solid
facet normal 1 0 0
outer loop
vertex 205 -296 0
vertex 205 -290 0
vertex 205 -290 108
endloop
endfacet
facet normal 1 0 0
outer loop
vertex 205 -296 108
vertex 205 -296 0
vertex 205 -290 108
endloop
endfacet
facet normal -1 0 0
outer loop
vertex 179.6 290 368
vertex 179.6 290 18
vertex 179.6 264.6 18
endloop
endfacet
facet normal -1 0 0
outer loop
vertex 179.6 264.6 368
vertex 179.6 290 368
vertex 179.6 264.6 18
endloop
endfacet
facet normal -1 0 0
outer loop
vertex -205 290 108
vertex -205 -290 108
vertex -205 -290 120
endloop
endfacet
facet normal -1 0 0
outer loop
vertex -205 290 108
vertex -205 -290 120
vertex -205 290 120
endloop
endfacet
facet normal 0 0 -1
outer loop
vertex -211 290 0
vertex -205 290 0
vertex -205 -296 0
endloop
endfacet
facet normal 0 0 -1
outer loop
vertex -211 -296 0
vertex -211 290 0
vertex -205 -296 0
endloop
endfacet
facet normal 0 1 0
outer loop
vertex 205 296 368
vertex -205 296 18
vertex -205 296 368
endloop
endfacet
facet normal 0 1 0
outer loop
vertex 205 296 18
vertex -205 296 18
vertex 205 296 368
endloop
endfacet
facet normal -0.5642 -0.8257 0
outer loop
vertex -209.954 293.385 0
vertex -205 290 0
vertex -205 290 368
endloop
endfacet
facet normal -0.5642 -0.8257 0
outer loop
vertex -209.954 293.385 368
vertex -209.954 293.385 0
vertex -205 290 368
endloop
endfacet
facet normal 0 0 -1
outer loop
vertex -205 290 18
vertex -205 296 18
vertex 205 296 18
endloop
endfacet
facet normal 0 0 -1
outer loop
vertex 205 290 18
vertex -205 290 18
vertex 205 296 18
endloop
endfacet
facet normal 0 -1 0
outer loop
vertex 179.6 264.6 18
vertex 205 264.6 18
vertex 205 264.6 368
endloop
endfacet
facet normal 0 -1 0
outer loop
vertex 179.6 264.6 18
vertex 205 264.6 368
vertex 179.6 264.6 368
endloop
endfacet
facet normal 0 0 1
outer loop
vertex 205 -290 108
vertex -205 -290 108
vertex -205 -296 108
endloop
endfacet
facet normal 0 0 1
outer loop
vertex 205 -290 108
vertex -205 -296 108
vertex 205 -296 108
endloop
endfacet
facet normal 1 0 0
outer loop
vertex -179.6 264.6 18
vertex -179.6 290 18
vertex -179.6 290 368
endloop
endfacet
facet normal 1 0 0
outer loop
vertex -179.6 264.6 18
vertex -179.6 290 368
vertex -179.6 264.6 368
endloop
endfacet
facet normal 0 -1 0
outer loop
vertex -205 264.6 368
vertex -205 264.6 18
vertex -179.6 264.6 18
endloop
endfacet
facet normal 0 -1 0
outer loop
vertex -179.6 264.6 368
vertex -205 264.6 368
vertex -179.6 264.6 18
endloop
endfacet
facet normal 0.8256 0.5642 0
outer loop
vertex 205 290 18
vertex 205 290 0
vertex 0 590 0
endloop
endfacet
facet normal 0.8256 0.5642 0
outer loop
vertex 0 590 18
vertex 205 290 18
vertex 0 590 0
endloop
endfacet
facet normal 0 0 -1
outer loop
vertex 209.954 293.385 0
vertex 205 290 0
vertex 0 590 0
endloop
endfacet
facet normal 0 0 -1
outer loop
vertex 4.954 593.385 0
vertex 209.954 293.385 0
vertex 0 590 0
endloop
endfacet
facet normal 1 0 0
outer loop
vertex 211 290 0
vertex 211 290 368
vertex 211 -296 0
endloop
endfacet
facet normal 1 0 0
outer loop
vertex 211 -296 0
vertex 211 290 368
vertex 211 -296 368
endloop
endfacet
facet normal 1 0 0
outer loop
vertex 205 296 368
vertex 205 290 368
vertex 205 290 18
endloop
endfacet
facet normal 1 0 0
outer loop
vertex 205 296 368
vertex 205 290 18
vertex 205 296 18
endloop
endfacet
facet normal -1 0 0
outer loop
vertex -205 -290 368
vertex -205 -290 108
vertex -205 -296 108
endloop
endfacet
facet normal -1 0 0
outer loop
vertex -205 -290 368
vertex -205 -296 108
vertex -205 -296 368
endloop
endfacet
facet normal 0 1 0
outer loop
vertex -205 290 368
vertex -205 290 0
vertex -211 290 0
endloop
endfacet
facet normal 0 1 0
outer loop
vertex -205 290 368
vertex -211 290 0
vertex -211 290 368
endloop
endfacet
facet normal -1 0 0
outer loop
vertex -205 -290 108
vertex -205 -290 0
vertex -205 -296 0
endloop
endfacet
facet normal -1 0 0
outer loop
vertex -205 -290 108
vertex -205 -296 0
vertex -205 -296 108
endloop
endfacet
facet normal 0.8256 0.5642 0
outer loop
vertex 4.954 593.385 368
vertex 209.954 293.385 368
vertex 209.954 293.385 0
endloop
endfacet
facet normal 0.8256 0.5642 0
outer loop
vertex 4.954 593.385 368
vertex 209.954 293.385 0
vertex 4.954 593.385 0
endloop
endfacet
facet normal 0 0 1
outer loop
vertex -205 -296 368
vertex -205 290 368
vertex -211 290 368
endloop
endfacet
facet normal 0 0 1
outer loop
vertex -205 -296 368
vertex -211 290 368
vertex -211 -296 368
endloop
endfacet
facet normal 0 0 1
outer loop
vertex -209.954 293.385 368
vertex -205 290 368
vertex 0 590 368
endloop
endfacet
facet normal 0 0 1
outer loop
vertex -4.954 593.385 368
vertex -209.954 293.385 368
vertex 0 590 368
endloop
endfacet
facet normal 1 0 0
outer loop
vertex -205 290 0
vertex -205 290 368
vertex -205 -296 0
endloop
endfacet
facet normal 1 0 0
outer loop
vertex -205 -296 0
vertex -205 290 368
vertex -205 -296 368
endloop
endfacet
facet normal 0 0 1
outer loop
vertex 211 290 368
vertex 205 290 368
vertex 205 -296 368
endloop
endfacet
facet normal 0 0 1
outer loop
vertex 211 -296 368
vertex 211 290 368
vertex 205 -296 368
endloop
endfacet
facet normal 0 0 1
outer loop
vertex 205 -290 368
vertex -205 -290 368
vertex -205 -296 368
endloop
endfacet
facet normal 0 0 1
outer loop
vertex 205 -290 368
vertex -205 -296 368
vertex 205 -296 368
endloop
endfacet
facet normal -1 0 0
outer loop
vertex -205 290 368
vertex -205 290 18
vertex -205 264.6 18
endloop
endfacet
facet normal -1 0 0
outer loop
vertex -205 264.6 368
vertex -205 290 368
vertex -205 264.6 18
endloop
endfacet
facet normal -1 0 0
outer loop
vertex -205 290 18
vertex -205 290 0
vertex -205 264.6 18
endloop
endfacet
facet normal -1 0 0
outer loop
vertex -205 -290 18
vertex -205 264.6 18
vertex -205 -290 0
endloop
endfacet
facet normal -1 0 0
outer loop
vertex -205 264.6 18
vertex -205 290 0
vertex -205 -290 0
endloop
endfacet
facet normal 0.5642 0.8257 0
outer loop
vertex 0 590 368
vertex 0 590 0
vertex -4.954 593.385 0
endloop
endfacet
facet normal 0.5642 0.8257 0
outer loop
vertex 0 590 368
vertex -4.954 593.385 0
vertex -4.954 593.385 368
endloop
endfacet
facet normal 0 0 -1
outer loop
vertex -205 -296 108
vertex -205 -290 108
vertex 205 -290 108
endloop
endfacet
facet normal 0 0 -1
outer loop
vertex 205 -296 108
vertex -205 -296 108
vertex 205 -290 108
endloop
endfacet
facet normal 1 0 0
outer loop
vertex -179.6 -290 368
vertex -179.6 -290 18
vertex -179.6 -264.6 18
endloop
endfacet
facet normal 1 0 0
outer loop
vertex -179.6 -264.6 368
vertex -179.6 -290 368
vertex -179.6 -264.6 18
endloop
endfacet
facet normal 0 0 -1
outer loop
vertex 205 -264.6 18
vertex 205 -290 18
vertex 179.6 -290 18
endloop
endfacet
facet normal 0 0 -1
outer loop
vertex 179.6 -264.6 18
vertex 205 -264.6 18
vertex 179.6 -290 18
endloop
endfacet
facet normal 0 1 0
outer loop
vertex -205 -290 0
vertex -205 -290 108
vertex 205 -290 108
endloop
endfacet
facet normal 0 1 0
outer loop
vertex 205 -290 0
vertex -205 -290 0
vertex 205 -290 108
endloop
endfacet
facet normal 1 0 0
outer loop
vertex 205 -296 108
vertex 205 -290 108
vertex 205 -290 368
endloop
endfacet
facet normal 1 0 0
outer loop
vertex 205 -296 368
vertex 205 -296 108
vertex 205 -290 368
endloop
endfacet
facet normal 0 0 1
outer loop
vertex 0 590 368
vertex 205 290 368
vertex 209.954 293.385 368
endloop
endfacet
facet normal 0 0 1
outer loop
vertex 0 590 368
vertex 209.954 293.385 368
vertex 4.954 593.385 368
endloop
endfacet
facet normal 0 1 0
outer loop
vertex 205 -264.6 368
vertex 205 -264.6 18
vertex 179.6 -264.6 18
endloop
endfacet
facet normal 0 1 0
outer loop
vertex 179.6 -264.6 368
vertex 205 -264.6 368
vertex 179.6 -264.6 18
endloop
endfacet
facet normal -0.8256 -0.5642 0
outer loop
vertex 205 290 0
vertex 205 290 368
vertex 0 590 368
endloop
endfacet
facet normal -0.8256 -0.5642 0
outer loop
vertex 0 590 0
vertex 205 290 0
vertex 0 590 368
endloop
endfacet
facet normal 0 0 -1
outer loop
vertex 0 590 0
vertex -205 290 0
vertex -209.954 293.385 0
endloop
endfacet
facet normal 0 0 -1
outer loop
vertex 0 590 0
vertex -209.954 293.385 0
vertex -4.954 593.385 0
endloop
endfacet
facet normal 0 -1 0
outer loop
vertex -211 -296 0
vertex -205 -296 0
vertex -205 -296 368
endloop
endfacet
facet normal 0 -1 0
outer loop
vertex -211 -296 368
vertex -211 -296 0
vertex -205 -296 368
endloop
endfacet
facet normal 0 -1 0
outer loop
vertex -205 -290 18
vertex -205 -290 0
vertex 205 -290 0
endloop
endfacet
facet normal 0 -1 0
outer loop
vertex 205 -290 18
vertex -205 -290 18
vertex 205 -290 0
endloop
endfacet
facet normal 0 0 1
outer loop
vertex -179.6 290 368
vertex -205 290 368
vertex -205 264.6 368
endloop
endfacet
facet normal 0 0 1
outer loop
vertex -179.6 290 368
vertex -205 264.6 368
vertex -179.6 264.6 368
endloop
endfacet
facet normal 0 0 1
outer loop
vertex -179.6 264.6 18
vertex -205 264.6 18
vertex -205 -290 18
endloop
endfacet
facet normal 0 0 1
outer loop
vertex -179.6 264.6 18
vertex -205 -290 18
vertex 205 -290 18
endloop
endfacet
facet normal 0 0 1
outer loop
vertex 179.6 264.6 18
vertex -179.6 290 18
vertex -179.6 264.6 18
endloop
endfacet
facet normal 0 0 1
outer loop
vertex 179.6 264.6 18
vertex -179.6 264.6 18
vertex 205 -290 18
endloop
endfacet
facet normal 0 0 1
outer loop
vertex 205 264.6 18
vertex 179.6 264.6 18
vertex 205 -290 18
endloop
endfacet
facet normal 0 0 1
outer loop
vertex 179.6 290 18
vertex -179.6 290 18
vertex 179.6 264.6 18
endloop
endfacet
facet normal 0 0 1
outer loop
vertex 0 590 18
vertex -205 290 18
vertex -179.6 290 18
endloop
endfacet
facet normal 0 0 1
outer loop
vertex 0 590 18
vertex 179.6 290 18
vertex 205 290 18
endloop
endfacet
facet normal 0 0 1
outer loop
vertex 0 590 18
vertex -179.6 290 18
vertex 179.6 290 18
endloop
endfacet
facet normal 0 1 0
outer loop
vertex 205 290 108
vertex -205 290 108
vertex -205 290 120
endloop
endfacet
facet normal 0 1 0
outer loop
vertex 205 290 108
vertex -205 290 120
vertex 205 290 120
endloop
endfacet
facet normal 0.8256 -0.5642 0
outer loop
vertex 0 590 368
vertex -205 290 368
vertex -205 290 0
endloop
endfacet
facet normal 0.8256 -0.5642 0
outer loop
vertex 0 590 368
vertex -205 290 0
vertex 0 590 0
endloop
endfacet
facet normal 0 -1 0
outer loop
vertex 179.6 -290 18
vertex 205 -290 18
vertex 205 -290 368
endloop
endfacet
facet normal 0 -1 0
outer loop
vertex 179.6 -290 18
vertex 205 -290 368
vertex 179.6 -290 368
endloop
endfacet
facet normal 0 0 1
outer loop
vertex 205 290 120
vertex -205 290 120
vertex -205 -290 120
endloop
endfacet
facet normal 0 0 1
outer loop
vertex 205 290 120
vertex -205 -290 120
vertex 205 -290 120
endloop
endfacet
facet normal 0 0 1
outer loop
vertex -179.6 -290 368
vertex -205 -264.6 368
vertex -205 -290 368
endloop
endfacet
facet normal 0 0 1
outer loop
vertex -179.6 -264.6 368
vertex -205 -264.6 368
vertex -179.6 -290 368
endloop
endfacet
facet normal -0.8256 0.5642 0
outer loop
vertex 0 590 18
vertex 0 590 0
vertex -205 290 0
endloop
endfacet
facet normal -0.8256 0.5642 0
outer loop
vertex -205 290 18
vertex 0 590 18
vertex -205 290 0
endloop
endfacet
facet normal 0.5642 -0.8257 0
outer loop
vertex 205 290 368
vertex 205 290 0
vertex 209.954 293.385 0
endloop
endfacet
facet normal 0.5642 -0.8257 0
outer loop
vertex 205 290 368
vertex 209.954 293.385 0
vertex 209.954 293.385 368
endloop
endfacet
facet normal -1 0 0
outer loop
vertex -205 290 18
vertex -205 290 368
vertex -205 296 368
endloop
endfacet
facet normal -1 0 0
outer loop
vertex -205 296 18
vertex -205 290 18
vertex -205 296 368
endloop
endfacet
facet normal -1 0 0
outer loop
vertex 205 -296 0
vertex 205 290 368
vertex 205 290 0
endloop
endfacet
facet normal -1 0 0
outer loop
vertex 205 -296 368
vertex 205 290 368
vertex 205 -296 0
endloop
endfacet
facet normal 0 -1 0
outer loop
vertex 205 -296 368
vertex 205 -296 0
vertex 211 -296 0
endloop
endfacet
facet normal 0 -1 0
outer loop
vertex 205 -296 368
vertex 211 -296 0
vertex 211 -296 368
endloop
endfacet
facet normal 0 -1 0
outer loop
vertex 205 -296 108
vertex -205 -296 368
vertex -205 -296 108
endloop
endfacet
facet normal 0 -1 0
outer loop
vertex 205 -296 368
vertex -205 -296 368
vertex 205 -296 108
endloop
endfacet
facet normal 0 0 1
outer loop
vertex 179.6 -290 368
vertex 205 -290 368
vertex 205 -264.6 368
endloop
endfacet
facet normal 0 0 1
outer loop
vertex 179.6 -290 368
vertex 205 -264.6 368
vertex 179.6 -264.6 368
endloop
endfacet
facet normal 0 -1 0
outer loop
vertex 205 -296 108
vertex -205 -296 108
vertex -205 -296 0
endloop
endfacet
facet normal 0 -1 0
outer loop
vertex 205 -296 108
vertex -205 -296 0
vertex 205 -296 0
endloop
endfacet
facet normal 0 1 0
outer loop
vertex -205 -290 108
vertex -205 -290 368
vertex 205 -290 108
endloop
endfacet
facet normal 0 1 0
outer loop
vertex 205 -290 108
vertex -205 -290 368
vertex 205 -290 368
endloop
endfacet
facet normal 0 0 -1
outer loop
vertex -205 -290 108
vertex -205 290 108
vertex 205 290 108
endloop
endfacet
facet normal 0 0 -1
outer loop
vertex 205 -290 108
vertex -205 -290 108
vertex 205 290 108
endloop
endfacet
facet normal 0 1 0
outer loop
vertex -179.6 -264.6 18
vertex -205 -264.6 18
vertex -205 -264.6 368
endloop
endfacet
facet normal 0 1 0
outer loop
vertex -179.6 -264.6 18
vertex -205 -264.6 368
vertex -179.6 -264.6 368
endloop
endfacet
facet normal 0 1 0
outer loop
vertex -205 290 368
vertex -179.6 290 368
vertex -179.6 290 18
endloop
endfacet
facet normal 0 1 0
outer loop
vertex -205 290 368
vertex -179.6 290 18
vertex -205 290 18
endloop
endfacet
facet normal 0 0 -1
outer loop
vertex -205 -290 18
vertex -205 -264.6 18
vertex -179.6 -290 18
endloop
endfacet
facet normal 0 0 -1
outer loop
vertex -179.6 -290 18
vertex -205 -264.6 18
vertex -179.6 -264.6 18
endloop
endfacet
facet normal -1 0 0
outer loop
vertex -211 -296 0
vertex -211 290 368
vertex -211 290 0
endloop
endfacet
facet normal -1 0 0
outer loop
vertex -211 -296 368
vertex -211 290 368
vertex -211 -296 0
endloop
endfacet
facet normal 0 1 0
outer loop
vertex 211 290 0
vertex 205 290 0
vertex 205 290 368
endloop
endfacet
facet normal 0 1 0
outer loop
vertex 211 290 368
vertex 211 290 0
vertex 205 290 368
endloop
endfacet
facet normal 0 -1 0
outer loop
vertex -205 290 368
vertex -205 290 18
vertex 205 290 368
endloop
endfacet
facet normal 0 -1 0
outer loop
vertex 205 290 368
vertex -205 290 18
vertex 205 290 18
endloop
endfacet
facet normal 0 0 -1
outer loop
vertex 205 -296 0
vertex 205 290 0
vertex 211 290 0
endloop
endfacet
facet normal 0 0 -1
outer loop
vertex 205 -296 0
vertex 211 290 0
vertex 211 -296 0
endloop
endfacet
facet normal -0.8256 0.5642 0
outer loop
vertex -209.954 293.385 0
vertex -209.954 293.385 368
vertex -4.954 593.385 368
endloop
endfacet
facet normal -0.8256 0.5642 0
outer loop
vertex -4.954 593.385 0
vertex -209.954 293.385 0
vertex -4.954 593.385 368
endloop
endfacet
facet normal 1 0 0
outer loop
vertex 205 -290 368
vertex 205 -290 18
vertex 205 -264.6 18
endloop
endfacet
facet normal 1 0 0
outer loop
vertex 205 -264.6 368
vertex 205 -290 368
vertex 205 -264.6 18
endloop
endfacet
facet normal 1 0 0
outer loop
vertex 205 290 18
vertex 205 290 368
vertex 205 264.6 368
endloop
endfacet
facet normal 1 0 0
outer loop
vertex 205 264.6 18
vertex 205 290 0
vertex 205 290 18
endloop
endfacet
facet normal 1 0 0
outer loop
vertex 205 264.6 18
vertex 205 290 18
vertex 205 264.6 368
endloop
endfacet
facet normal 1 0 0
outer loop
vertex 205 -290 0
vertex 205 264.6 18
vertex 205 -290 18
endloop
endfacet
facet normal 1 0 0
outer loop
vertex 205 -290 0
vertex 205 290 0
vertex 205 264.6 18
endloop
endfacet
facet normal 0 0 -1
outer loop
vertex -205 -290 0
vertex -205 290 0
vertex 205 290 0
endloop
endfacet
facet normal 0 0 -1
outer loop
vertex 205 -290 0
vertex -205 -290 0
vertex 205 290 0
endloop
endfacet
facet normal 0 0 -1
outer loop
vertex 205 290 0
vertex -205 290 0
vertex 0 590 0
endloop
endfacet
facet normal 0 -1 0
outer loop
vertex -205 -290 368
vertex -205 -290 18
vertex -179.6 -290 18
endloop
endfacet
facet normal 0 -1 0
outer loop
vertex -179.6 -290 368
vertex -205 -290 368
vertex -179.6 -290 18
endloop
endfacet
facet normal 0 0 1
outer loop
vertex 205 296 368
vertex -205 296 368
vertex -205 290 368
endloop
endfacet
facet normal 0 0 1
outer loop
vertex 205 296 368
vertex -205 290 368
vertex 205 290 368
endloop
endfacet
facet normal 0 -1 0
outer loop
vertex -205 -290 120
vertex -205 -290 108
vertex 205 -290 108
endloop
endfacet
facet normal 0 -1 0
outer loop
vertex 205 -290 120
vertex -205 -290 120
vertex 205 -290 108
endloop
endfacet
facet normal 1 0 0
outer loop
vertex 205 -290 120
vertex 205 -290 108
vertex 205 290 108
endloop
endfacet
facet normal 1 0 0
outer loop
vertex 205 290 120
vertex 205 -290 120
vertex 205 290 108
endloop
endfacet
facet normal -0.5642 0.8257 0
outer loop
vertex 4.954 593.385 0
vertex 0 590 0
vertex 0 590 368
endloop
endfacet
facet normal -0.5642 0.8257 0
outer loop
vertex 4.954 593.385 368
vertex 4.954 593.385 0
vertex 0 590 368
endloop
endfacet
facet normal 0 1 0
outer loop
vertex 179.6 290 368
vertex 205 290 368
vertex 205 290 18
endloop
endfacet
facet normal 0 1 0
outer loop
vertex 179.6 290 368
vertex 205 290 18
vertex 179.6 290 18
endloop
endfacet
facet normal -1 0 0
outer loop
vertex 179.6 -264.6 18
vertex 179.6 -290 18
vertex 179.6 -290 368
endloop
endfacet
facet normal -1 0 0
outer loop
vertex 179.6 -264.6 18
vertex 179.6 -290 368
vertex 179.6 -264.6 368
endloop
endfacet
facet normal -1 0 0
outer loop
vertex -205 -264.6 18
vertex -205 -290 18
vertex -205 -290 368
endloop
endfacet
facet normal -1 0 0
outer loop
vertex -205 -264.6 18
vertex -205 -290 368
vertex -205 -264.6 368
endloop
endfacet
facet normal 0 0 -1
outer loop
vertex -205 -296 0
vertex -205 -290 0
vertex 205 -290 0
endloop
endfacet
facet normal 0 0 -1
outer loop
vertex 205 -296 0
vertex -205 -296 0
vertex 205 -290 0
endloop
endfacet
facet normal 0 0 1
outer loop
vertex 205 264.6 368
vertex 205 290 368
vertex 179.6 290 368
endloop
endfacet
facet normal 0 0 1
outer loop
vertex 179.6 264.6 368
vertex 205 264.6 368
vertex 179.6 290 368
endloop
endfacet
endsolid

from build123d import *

# Parameters (mm, degrees)
F0_W      = 410
F0_H      = 580
F1_DEPTH  = 18
F2_W      = 25.4
F2_H      = 25.4
F3_DEPTH  = 350
F7_W      = 410
F7_H      = 580
F8_DEPTH  = 12
F10_DEPTH = 18
F11_W     = 410
F11_H     = 108
F12_DEPTH = 6
F13_W     = 410
F13_H     = 260
F14_DEPTH = 6
F15_W     = 586
F15_H     = 368
F16_DEPTH = 6
F18_W     = 363.352445
F18_H     = 368
F19_DEPTH = 6
F21_W     = 410
F21_H     = 6
F22_DEPTH = 350


with BuildPart() as f1:
    # F0 (on Top) → F1 (new body)
    with BuildSketch(Plane.XY):
        Rectangle(F0_W, F0_H)
    extrude(amount=F1_DEPTH)



with BuildPart() as f3:
    # F2 (on face) → F3 (new body)
    with BuildSketch(Plane.XY.offset(18)):
        with Locations((-192.3, -277.3)):
            Rectangle(F2_W, F2_H)
    extrude(amount=F3_DEPTH)


with BuildPart() as f4_1:
    # F4: instance of F3
    add(f3.part.mirror(Plane.XZ))


with BuildPart() as f5_1:
    # F5: instance of F4_1
    add(f4_1.part.mirror(Plane.YZ))


with BuildPart() as f5_2:
    # F5: instance of F3
    add(f3.part.mirror(Plane.YZ))


with BuildPart() as f8:
    # F7 (on offset) → F8 (new body)
    with BuildSketch(Plane.XY.offset(108)):
        Rectangle(F7_W, F7_H)
    extrude(amount=F8_DEPTH)


with BuildPart() as f1_1:
    add(f1.part)

    add(f4_1.part)  # F10 merges F4_1

    add(f5_1.part)  # F10 merges F5_1
    # F9 (on Top) → F10 (join)
    with BuildSketch(Plane.XY):
        Polygon((205, 290), (0, 590), (-205, 290), align=None)
    extrude(amount=F10_DEPTH)


with BuildPart() as f12:
    # F11 (on face) → F12 (new body)
    with BuildSketch(Plane.XZ.offset(290)):
        with Locations((0, 54)):
            Rectangle(F11_W, F11_H)
    extrude(amount=F12_DEPTH)


with BuildPart() as f14:
    # F13 (on face) → F14 (new body)
    with BuildSketch(Plane.XZ.offset(290)):
        with Locations((0, 238)):
            Rectangle(F13_W, F13_H)
    extrude(amount=F14_DEPTH)


with BuildPart() as f16:
    # F15 (on face) → F16 (new body)
    with BuildSketch(Plane(origin=(-205, 0, 0), x_dir=(0, -1, 0), z_dir=(-1, 0, 0))):
        with Locations((3, 184)):
            Rectangle(F15_W, F15_H)
    extrude(amount=F16_DEPTH)


with BuildPart() as f17_1:
    # F17: instance of F16
    add(f16.part.mirror(Plane.YZ))


with BuildPart() as f19:
    # F18 (on face) → F19 (new body)
    with BuildSketch(Plane(origin=(274.834312, 187.803446, 0), x_dir=(-0.564191, 0.825645, 0), z_dir=(0.825645, 0.564191, 0))):
        with Locations((305.454116, 184)):
            Rectangle(F18_W, F18_H)
    extrude(amount=F19_DEPTH)


with BuildPart() as f20_1:
    # F20: instance of F19
    add(f19.part.mirror(Plane.YZ))


with BuildPart() as f22:
    # F21 (on face) → F22 (new body)
    with BuildSketch(Plane.XY.offset(18)):
        with Locations((0, 293)):
            Rectangle(F21_W, F21_H)
    extrude(amount=F22_DEPTH)


solid = Compound([f3.part, f5_2.part, f8.part, f1_1.part, f12.part, f14.part, f16.part, f17_1.part, f19.part, f20_1.part, f22.part])
